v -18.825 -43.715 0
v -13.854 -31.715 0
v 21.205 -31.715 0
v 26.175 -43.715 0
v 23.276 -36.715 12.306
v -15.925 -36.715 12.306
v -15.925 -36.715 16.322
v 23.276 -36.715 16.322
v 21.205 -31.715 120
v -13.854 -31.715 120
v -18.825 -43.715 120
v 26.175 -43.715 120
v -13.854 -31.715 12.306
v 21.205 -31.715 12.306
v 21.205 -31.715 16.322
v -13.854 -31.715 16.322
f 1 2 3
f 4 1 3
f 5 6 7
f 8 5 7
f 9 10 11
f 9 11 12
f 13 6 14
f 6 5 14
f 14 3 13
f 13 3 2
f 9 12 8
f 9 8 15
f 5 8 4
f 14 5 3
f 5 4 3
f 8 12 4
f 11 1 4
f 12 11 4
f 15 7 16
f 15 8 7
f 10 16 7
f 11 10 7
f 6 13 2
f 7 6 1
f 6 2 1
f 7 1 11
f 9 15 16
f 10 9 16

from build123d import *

# Parameters (mm, degrees)
F1_DEPTH = 120
F2_W     = 35.058874
F2_H     = 4.015654
F3_DEPTH = 5
F4_W     = 5
F4_H     = 4.015654
F5_DEPTH = 25
F6_W     = 5
F6_H     = 4.015654
F7_DEPTH = 25


with BuildPart() as f1:
    # F0 (on Top) → F1 (new body)
    with BuildSketch(Plane.XY):
        Polygon((-13.854021, -31.714595), (-18.824584, -43.714595), (26.175416, -43.714595), (21.204853, -31.714595), align=None)
    extrude(amount=F1_DEPTH)

    # F2 (on face) → F3 (cut)
    with BuildSketch(Plane(origin=(0, -31.714595, 0), x_dir=(-1, 0, 0), z_dir=(0, 1, 0))):
        with Locations((-3.675416, 14.314208)):
            Rectangle(F2_W, F2_H)
    extrude(amount=-F3_DEPTH, mode=Mode.SUBTRACT)

    # F4 (on face) → F5 (cut)
    with BuildSketch(Plane.YZ.offset(-13.854021)):
        with Locations((-34.214595, 14.314208)):
            Rectangle(F4_W, F4_H)
    extrude(amount=-F5_DEPTH, mode=Mode.SUBTRACT)

    # F6 (on face) → F7 (cut)
    with BuildSketch(Plane(origin=(21.204853, 0, 0), x_dir=(0, -1, 0), z_dir=(-1, 0, 0))):
        with Locations((34.214595, 14.314208)):
            Rectangle(F6_W, F6_H)
    extrude(amount=-F7_DEPTH, mode=Mode.SUBTRACT)


solid = f1.part
